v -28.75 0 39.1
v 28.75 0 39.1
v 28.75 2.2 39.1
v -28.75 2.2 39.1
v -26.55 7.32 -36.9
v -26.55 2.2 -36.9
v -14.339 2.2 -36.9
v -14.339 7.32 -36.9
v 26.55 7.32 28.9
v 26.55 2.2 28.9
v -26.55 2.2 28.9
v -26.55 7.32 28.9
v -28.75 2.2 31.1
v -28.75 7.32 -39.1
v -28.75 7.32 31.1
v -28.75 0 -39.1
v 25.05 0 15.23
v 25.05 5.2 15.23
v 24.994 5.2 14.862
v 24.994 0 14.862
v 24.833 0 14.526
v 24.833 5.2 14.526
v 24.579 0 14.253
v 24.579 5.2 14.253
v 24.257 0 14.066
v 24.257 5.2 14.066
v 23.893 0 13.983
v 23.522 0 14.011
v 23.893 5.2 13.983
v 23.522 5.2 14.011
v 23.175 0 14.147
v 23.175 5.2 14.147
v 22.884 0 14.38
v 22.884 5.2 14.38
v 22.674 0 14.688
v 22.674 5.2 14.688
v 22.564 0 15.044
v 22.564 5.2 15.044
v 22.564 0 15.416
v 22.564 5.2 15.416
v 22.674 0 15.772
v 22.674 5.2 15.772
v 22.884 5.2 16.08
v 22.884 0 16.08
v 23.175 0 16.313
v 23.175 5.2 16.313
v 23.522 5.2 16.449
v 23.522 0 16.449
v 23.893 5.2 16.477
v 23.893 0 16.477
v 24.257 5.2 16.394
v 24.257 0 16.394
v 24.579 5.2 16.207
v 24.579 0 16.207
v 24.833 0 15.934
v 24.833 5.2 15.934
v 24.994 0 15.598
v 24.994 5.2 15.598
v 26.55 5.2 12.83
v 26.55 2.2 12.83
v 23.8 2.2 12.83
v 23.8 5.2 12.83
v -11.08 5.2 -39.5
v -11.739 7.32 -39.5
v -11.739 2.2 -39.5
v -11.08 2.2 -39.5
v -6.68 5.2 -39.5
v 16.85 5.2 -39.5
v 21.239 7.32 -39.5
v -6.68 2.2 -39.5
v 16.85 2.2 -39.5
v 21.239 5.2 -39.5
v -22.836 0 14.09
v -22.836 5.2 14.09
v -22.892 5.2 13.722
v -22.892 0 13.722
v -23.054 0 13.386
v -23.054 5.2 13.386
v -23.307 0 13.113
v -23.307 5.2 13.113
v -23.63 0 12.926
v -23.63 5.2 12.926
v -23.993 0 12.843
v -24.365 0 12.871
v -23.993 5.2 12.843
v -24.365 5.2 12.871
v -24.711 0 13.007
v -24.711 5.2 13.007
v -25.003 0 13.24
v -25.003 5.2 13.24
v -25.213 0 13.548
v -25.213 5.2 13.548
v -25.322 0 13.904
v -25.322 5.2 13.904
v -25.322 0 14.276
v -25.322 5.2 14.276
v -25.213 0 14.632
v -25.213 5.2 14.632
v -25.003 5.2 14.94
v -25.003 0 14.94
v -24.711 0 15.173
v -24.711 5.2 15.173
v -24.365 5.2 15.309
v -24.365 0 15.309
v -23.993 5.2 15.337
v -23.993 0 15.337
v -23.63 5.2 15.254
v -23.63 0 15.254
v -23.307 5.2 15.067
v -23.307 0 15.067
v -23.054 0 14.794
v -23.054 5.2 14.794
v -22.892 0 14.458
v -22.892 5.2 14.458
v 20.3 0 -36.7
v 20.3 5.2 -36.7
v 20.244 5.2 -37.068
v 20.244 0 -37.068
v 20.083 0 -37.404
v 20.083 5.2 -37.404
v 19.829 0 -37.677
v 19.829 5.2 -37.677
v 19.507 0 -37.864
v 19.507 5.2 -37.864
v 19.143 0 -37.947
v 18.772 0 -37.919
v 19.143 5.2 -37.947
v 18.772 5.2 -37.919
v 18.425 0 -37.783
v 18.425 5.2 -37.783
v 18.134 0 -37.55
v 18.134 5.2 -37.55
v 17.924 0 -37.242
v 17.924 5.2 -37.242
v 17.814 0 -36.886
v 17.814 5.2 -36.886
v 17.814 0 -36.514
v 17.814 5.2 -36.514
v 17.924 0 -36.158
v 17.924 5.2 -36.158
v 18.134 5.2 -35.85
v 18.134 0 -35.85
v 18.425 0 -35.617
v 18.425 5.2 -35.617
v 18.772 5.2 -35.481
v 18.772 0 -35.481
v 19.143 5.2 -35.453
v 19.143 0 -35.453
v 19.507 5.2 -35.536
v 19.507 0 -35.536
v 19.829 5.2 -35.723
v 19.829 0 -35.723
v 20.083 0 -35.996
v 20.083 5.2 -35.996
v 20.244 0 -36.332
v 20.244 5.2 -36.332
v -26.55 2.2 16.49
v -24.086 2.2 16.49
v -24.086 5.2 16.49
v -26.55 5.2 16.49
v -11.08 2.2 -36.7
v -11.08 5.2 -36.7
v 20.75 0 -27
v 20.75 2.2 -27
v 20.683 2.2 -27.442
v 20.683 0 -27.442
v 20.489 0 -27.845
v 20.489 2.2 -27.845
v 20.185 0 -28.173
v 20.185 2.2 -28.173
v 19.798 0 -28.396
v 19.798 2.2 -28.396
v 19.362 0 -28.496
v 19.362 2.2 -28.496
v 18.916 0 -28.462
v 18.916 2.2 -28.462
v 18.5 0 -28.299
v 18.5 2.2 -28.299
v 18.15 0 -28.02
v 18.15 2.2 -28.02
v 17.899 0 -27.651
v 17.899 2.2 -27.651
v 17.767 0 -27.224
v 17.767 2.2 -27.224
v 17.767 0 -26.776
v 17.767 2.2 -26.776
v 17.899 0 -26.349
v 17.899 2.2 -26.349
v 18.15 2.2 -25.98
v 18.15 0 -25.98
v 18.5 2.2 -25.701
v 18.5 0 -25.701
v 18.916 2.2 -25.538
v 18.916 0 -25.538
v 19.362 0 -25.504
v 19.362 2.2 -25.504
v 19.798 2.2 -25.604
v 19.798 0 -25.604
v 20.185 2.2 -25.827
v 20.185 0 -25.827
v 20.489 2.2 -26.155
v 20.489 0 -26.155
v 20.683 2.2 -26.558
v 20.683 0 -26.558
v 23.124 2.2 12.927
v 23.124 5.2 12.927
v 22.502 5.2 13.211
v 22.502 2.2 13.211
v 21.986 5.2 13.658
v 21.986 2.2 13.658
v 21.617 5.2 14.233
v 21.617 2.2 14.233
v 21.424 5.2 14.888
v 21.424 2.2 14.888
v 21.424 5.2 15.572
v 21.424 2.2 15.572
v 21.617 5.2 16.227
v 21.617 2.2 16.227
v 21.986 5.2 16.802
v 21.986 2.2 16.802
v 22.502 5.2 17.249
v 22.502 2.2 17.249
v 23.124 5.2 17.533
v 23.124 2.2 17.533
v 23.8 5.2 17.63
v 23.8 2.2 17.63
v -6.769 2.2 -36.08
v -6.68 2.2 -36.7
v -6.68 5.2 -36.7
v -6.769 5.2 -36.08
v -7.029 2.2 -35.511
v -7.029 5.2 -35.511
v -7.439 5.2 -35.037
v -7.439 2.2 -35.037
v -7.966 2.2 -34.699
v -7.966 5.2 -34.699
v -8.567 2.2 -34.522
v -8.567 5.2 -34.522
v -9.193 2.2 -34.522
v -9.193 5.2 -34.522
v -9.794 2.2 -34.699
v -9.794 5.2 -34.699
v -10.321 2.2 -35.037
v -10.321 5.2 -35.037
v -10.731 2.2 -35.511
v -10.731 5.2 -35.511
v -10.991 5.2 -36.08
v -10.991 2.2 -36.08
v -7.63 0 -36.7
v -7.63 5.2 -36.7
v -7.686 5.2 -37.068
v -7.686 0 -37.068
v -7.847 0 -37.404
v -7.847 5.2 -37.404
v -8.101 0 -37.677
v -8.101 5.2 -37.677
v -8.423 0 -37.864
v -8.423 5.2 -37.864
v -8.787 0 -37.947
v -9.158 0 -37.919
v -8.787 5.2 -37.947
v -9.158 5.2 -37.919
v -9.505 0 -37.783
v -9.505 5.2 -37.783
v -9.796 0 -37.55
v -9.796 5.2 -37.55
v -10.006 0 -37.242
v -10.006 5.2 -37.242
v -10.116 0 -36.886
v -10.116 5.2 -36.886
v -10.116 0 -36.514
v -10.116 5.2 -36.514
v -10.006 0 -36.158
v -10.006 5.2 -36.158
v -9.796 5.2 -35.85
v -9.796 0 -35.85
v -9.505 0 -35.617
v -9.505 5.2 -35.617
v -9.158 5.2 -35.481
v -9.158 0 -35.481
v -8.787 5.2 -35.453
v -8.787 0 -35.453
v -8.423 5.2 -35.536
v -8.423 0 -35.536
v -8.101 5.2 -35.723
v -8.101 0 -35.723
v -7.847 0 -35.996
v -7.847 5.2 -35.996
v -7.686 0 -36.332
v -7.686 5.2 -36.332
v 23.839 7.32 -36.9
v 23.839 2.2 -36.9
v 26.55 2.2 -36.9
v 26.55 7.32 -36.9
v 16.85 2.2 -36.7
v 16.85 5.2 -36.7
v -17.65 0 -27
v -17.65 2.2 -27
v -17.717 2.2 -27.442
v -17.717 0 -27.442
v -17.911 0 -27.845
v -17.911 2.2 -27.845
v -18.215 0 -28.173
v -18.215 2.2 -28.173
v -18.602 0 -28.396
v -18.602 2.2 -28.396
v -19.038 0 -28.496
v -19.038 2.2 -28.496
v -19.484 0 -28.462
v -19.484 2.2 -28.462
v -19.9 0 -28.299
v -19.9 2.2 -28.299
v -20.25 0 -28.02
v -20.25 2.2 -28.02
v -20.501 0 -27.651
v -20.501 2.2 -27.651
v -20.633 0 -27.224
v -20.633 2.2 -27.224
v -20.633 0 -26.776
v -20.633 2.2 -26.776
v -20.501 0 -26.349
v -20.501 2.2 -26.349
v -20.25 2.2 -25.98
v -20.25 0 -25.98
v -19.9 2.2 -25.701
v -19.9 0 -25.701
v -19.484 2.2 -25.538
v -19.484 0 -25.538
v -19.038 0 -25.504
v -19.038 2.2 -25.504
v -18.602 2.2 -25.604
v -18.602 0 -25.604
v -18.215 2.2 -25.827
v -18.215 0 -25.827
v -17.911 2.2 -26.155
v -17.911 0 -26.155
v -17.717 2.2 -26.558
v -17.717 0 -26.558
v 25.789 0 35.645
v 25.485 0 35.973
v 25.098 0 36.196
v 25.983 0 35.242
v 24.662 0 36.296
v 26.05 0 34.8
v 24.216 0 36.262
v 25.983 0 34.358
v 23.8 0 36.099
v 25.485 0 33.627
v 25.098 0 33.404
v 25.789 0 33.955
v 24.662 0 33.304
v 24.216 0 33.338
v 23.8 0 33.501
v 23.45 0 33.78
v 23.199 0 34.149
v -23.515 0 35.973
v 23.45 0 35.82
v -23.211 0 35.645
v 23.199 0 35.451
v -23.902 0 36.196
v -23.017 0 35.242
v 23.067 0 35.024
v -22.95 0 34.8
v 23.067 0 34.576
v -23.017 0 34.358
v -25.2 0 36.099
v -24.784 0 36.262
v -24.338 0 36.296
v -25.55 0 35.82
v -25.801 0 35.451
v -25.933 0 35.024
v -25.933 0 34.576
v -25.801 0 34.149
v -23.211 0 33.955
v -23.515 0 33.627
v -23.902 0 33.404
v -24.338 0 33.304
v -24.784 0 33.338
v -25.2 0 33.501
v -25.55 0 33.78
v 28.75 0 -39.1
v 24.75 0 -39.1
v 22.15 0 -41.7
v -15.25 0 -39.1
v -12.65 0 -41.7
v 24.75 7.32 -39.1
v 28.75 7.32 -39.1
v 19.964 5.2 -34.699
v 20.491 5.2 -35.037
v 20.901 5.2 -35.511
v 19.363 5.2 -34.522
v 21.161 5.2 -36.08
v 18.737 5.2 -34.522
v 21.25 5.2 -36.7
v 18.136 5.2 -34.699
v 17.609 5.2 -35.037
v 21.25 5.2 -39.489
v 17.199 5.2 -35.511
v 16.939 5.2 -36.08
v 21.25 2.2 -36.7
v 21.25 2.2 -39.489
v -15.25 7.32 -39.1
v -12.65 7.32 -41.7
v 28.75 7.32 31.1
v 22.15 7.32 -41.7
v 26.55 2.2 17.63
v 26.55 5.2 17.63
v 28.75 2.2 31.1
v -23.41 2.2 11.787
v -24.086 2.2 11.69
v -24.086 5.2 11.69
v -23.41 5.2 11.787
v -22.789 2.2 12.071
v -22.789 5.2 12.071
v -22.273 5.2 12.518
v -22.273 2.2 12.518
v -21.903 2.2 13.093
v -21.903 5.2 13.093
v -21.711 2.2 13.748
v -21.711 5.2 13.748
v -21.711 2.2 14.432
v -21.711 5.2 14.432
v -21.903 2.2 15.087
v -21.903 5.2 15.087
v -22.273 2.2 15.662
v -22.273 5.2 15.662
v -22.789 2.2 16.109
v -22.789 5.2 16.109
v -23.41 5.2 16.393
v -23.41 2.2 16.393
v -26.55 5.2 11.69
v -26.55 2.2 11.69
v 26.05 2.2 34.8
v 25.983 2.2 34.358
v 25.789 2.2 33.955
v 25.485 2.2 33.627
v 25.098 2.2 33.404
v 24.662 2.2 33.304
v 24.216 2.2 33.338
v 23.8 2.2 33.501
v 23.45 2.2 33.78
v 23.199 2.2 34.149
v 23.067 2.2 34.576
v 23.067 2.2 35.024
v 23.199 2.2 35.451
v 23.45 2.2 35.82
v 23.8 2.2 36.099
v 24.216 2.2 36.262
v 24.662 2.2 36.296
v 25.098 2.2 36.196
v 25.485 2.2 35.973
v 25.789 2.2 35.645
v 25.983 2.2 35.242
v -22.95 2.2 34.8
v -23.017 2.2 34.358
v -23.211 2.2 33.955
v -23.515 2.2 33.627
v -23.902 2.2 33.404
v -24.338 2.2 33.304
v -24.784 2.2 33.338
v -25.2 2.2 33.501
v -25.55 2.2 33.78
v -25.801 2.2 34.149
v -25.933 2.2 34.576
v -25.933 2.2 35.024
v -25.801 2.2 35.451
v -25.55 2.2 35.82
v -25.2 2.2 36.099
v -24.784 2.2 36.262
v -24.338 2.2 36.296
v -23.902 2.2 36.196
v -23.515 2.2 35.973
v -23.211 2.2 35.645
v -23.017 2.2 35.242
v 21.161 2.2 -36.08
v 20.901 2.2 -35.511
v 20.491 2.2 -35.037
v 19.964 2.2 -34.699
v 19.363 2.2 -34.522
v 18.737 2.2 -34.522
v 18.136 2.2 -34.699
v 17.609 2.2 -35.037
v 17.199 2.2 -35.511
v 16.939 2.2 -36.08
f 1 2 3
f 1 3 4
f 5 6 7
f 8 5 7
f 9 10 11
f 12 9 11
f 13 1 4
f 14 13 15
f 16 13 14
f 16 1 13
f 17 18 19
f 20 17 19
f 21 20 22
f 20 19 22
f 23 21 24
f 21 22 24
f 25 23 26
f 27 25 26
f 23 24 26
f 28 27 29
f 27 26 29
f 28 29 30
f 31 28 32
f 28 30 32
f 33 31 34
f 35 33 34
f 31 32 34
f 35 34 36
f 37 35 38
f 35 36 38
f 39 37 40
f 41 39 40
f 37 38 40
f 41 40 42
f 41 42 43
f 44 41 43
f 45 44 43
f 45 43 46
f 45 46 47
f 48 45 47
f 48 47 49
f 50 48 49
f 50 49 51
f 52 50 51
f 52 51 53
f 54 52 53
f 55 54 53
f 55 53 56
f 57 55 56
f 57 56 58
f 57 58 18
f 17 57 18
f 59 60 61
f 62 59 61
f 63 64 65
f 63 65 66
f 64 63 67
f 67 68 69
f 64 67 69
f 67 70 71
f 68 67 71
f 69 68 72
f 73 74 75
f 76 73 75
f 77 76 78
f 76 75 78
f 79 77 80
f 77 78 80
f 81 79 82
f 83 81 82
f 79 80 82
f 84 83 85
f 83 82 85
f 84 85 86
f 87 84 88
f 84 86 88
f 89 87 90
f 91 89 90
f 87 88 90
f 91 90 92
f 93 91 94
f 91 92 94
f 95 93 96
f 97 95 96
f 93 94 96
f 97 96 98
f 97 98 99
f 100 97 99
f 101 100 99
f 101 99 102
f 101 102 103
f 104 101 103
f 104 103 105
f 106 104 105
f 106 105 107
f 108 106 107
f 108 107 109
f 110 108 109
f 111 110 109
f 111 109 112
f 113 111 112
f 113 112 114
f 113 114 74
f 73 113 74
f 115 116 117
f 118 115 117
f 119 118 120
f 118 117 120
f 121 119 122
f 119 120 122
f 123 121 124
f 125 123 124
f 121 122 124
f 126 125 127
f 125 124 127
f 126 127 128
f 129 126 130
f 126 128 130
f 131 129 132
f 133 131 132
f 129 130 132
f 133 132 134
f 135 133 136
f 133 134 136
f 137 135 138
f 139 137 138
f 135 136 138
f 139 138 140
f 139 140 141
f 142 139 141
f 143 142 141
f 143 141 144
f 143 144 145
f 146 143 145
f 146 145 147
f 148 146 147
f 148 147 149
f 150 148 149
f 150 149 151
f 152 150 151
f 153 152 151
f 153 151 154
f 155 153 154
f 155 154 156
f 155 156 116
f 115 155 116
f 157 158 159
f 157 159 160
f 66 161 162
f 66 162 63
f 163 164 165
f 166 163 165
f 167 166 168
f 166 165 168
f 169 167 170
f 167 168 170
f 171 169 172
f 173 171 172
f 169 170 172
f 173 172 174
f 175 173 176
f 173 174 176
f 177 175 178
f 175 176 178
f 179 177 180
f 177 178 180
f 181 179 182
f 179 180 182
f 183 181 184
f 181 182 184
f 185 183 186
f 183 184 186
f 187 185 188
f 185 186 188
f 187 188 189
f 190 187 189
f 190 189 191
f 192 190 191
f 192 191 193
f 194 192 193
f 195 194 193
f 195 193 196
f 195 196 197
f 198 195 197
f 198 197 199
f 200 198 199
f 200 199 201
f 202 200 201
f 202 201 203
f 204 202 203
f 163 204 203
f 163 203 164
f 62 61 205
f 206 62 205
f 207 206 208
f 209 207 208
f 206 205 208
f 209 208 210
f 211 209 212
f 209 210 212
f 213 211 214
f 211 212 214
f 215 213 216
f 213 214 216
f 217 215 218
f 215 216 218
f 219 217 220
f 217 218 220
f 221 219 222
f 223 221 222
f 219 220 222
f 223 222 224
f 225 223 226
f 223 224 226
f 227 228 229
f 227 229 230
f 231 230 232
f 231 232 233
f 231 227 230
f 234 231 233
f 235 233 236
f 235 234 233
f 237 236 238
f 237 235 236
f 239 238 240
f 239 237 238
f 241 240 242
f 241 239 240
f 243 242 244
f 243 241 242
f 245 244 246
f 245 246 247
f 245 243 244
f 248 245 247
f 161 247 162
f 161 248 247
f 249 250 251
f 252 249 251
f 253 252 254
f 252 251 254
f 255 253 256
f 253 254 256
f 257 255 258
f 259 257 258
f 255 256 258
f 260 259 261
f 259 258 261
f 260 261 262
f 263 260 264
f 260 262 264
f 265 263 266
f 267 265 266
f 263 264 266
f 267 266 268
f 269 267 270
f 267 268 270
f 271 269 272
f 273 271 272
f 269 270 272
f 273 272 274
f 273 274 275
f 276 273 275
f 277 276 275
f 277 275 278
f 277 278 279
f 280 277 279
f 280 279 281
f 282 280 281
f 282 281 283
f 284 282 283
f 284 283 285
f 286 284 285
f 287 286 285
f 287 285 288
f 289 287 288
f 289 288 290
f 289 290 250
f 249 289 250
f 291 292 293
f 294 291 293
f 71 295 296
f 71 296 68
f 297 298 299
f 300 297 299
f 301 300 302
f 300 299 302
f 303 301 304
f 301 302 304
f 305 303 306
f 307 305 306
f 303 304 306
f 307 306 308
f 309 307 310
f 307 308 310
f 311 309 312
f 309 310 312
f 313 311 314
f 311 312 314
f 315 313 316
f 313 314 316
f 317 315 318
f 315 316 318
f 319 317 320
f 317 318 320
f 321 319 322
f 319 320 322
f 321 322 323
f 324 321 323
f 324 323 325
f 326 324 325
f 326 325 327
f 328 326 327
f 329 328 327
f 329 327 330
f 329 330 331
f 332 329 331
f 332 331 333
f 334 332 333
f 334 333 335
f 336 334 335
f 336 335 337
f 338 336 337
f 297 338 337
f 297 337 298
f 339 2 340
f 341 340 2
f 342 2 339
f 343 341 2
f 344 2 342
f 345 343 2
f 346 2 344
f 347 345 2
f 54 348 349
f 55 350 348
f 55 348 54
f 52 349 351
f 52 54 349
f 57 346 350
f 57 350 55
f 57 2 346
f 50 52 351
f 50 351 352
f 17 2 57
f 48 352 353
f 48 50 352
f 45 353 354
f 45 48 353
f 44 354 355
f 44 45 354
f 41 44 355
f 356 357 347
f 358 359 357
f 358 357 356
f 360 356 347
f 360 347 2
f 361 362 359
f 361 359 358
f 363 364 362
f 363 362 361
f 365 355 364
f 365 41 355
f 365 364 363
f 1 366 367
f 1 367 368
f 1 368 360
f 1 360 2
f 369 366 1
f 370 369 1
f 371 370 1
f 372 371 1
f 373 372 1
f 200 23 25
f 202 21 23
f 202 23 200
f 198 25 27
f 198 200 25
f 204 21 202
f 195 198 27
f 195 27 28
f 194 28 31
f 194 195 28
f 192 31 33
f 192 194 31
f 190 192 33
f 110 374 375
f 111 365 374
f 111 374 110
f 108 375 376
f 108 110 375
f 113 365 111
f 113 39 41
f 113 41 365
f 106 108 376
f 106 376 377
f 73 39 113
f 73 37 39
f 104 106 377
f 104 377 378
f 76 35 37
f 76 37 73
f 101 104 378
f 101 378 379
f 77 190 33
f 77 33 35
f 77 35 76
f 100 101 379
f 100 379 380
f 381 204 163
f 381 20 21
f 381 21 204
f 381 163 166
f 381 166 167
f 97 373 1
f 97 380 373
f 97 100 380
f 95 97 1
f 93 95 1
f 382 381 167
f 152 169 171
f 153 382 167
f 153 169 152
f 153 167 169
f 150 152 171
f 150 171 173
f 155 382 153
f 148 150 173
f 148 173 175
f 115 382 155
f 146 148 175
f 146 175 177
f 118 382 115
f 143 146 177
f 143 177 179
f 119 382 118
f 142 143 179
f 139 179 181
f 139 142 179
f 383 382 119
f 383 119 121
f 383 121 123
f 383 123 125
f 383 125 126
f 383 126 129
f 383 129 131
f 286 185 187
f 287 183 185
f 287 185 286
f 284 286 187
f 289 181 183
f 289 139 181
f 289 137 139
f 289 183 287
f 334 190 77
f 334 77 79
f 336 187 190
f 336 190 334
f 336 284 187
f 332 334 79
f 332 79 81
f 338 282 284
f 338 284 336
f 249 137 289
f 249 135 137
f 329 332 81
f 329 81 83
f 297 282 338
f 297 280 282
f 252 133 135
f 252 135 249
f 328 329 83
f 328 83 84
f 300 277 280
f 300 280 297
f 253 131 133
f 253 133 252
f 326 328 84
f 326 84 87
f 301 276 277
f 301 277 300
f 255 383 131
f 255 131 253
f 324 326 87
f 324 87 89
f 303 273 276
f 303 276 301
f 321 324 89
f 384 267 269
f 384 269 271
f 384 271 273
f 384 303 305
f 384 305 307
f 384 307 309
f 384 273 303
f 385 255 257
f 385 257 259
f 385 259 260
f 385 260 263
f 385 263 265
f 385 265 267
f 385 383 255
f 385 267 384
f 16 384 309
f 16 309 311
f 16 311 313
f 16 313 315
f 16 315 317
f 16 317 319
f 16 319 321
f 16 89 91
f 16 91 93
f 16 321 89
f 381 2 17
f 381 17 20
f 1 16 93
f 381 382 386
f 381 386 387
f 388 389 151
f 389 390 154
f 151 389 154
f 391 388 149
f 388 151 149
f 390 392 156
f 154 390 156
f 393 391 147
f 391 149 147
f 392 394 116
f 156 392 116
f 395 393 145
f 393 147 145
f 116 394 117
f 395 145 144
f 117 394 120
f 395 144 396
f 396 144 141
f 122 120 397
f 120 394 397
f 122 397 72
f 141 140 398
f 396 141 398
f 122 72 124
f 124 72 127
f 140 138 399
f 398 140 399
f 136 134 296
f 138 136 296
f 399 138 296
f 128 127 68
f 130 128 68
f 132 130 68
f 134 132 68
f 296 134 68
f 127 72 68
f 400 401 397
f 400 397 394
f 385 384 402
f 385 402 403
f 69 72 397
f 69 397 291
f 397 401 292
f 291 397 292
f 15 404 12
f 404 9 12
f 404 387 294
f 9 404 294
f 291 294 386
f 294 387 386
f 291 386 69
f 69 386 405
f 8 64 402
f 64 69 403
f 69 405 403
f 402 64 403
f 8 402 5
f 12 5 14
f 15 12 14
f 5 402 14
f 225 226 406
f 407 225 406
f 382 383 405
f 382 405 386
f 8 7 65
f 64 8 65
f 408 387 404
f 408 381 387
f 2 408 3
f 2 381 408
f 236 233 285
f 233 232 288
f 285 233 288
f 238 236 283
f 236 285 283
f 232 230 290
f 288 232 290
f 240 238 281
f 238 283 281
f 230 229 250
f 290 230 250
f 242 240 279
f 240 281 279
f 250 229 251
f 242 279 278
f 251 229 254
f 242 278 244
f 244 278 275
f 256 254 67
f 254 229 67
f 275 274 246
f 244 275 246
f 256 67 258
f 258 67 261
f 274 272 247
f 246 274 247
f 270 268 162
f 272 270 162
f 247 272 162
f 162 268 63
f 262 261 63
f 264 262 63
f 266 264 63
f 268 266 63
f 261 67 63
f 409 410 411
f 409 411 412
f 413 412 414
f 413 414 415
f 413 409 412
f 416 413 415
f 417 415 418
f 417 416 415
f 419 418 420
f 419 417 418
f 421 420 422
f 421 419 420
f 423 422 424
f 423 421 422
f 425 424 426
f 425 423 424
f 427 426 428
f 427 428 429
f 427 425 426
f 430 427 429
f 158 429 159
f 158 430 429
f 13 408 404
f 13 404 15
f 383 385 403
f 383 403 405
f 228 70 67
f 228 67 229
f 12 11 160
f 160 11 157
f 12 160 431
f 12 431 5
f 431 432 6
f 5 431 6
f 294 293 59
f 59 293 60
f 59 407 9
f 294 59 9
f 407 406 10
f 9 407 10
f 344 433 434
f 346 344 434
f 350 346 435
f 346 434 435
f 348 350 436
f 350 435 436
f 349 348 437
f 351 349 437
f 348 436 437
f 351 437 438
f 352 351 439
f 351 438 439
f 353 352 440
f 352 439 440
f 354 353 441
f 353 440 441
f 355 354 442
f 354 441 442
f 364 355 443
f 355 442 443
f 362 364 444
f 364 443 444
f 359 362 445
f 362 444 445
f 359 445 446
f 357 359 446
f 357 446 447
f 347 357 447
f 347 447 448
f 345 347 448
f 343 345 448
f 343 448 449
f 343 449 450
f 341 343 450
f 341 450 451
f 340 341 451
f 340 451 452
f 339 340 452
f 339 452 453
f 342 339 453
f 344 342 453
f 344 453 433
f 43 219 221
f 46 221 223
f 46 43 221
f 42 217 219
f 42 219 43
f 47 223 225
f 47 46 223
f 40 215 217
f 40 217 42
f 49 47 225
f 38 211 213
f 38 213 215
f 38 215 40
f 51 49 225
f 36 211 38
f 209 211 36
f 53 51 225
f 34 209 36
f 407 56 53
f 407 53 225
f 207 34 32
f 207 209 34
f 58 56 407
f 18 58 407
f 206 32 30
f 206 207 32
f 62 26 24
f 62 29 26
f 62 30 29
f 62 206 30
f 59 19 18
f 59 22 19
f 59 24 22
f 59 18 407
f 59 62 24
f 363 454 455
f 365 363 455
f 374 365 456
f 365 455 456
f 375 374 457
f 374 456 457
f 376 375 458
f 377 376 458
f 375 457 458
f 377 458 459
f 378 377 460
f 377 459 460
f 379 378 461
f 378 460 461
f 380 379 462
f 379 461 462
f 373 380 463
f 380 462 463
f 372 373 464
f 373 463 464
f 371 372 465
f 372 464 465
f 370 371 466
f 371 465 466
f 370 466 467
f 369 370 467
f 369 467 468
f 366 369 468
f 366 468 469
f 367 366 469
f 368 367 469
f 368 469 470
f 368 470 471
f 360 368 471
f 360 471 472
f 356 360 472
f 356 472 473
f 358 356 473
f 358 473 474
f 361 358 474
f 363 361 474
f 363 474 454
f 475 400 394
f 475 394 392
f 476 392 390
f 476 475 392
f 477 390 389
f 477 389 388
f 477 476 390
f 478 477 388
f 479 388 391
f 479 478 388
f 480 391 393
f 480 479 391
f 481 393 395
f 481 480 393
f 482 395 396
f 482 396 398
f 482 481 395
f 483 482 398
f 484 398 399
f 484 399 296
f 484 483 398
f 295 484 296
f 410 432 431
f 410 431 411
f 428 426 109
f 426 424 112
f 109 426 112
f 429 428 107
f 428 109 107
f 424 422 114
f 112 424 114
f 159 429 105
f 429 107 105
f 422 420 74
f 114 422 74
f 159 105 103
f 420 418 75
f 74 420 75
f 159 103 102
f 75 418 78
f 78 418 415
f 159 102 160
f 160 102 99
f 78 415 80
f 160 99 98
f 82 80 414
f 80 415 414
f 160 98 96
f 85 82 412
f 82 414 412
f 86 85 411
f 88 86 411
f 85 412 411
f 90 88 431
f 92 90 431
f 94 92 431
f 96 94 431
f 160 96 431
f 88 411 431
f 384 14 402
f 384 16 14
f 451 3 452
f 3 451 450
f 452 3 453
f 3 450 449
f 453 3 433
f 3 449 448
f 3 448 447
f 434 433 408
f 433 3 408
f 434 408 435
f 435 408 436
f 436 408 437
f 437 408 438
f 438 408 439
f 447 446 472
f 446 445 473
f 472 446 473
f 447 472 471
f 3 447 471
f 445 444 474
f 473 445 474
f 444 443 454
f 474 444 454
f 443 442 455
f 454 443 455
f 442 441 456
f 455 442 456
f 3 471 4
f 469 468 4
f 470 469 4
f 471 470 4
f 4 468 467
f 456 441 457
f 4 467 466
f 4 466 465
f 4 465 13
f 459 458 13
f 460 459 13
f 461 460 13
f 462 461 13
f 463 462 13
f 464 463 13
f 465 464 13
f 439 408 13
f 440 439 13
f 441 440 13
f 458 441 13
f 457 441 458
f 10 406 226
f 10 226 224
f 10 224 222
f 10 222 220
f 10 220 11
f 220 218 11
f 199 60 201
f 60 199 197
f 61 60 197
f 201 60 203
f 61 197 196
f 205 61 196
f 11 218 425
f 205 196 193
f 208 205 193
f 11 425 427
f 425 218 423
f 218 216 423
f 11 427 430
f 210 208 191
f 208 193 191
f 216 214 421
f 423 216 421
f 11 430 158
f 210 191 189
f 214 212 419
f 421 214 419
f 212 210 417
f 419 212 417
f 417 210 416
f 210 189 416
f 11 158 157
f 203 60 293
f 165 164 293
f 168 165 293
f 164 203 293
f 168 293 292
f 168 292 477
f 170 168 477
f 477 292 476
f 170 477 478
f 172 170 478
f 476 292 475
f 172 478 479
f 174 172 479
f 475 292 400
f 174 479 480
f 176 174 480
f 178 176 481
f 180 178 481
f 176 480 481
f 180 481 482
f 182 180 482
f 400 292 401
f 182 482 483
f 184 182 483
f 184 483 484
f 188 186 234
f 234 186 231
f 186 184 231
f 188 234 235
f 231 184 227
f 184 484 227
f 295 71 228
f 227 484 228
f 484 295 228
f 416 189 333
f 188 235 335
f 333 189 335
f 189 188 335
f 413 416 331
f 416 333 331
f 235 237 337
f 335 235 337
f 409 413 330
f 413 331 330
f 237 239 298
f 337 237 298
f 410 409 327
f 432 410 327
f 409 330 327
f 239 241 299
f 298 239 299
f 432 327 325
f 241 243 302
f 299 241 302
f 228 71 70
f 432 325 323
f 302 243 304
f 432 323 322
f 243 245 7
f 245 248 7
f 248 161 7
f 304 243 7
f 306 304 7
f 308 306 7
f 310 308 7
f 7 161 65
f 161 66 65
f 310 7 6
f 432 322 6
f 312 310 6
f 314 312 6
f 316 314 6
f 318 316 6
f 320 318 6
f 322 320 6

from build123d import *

# Parameters (mm, degrees)
BOSS_EXTRUDE1_DEPTH = 2.2
EXTRUDE_THIN1_DEPTH = 5.12
BOSS_EXTRUDE2_DEPTH = 3
SKETCH6_R           = 1.25
SKETCH6_R_2         = 1.5
CUT_EXTRUDE1_DEPTH  = 8.32


with BuildPart() as part:
    # Sketch1 → Boss-Extrude1 (new body)
    with BuildSketch(Plane(origin=(0, 0, 0), x_dir=(1, 0, 0), z_dir=(0, 1, 0))):
        Polygon((-15.25, 39.1), (-12.65, 41.7), (22.15, 41.7), (24.75, 39.1), (28.75, 39.1), (28.75, -39.1), (-28.75, -39.1), (-28.75, 39.1), align=None)
    extrude(amount=BOSS_EXTRUDE1_DEPTH)

    # Sketch3 → Extrude-Thin1 (add)
    with BuildSketch(Plane(origin=(0, 2.2, 0), x_dir=(1, 0, 0), z_dir=(0, 1, 0))):
        Polygon((-28.75, 39.1), (-15.25, 39.1), (-12.65, 41.7), (22.15, 41.7), (24.75, 39.1), (28.75, 39.1), (28.75, -31.1), (-28.75, -31.1), align=None)
        Polygon((-26.55, 36.9), (-14.338730163, 36.9), (-11.738730163, 39.5), (21.238730163, 39.5), (23.838730163, 36.9), (26.55, 36.9), (26.55, -28.9), (-26.55, -28.9), align=None, mode=Mode.SUBTRACT)
    extrude(amount=EXTRUDE_THIN1_DEPTH)

    # Sketch4 → Boss-Extrude2 (add)
    with BuildSketch(Plane(origin=(0, 2.2, 0), x_dir=(1, 0, 0), z_dir=(0, 1, 0))):
        with BuildLine():
            Line((-11.08, 39.5), (-6.68, 39.5))
            Line((-6.68, 39.5), (-6.68, 36.7))
            ThreePointArc((-6.68, 36.7), (-8.88, 34.5), (-11.08, 36.7))
            Line((-11.08, 36.7), (-11.08, 39.5))
        make_face()
        with BuildLine():
            Line((16.85, 39.5), (21.25, 39.5))
            Line((21.25, 39.5), (21.25, 36.7))
            ThreePointArc((21.25, 36.7), (19.05, 34.5), (16.85, 36.7))
            Line((16.85, 36.7), (16.85, 39.5))
        make_face()
        with BuildLine():
            Line((26.55, -12.83), (23.8, -12.83))
            ThreePointArc((23.8, -12.83), (21.4, -15.23), (23.8, -17.63))
            Line((23.8, -17.63), (26.55, -17.63))
            Line((26.55, -17.63), (26.55, -12.83))
        make_face()
        with BuildLine():
            Line((-26.55, -11.69), (-24.086432316, -11.69))
            ThreePointArc((-24.086432316, -11.69), (-21.686432316, -14.09), (-24.086432316, -16.49))
            Line((-24.086432316, -16.49), (-26.55, -16.49))
            Line((-26.55, -16.49), (-26.55, -11.69))
        make_face()
    extrude(amount=BOSS_EXTRUDE2_DEPTH)

    # Sketch6 → Cut-Extrude1 (cut, through all)
    with BuildSketch(Plane(origin=(0, 7.32, 0), x_dir=(1, 0, 0), z_dir=(0, 1, 0))):
        with Locations((-8.88, 36.7)):
            Circle(SKETCH6_R)
        with Locations((19.05, 36.7)):
            Circle(SKETCH6_R)
        with Locations((23.8, -15.23)):
            Circle(SKETCH6_R)
        with Locations((-24.086432316, -14.09)):
            Circle(SKETCH6_R)
        with Locations((-19.15, 27)):
            Circle(SKETCH6_R_2)
        with Locations((19.25, 27)):
            Circle(SKETCH6_R_2)
        with Locations((-24.45, -34.8)):
            Circle(SKETCH6_R_2)
        with Locations((24.55, -34.8)):
            Circle(SKETCH6_R_2)
    extrude(amount=-CUT_EXTRUDE1_DEPTH, mode=Mode.SUBTRACT)


solid = part.part
